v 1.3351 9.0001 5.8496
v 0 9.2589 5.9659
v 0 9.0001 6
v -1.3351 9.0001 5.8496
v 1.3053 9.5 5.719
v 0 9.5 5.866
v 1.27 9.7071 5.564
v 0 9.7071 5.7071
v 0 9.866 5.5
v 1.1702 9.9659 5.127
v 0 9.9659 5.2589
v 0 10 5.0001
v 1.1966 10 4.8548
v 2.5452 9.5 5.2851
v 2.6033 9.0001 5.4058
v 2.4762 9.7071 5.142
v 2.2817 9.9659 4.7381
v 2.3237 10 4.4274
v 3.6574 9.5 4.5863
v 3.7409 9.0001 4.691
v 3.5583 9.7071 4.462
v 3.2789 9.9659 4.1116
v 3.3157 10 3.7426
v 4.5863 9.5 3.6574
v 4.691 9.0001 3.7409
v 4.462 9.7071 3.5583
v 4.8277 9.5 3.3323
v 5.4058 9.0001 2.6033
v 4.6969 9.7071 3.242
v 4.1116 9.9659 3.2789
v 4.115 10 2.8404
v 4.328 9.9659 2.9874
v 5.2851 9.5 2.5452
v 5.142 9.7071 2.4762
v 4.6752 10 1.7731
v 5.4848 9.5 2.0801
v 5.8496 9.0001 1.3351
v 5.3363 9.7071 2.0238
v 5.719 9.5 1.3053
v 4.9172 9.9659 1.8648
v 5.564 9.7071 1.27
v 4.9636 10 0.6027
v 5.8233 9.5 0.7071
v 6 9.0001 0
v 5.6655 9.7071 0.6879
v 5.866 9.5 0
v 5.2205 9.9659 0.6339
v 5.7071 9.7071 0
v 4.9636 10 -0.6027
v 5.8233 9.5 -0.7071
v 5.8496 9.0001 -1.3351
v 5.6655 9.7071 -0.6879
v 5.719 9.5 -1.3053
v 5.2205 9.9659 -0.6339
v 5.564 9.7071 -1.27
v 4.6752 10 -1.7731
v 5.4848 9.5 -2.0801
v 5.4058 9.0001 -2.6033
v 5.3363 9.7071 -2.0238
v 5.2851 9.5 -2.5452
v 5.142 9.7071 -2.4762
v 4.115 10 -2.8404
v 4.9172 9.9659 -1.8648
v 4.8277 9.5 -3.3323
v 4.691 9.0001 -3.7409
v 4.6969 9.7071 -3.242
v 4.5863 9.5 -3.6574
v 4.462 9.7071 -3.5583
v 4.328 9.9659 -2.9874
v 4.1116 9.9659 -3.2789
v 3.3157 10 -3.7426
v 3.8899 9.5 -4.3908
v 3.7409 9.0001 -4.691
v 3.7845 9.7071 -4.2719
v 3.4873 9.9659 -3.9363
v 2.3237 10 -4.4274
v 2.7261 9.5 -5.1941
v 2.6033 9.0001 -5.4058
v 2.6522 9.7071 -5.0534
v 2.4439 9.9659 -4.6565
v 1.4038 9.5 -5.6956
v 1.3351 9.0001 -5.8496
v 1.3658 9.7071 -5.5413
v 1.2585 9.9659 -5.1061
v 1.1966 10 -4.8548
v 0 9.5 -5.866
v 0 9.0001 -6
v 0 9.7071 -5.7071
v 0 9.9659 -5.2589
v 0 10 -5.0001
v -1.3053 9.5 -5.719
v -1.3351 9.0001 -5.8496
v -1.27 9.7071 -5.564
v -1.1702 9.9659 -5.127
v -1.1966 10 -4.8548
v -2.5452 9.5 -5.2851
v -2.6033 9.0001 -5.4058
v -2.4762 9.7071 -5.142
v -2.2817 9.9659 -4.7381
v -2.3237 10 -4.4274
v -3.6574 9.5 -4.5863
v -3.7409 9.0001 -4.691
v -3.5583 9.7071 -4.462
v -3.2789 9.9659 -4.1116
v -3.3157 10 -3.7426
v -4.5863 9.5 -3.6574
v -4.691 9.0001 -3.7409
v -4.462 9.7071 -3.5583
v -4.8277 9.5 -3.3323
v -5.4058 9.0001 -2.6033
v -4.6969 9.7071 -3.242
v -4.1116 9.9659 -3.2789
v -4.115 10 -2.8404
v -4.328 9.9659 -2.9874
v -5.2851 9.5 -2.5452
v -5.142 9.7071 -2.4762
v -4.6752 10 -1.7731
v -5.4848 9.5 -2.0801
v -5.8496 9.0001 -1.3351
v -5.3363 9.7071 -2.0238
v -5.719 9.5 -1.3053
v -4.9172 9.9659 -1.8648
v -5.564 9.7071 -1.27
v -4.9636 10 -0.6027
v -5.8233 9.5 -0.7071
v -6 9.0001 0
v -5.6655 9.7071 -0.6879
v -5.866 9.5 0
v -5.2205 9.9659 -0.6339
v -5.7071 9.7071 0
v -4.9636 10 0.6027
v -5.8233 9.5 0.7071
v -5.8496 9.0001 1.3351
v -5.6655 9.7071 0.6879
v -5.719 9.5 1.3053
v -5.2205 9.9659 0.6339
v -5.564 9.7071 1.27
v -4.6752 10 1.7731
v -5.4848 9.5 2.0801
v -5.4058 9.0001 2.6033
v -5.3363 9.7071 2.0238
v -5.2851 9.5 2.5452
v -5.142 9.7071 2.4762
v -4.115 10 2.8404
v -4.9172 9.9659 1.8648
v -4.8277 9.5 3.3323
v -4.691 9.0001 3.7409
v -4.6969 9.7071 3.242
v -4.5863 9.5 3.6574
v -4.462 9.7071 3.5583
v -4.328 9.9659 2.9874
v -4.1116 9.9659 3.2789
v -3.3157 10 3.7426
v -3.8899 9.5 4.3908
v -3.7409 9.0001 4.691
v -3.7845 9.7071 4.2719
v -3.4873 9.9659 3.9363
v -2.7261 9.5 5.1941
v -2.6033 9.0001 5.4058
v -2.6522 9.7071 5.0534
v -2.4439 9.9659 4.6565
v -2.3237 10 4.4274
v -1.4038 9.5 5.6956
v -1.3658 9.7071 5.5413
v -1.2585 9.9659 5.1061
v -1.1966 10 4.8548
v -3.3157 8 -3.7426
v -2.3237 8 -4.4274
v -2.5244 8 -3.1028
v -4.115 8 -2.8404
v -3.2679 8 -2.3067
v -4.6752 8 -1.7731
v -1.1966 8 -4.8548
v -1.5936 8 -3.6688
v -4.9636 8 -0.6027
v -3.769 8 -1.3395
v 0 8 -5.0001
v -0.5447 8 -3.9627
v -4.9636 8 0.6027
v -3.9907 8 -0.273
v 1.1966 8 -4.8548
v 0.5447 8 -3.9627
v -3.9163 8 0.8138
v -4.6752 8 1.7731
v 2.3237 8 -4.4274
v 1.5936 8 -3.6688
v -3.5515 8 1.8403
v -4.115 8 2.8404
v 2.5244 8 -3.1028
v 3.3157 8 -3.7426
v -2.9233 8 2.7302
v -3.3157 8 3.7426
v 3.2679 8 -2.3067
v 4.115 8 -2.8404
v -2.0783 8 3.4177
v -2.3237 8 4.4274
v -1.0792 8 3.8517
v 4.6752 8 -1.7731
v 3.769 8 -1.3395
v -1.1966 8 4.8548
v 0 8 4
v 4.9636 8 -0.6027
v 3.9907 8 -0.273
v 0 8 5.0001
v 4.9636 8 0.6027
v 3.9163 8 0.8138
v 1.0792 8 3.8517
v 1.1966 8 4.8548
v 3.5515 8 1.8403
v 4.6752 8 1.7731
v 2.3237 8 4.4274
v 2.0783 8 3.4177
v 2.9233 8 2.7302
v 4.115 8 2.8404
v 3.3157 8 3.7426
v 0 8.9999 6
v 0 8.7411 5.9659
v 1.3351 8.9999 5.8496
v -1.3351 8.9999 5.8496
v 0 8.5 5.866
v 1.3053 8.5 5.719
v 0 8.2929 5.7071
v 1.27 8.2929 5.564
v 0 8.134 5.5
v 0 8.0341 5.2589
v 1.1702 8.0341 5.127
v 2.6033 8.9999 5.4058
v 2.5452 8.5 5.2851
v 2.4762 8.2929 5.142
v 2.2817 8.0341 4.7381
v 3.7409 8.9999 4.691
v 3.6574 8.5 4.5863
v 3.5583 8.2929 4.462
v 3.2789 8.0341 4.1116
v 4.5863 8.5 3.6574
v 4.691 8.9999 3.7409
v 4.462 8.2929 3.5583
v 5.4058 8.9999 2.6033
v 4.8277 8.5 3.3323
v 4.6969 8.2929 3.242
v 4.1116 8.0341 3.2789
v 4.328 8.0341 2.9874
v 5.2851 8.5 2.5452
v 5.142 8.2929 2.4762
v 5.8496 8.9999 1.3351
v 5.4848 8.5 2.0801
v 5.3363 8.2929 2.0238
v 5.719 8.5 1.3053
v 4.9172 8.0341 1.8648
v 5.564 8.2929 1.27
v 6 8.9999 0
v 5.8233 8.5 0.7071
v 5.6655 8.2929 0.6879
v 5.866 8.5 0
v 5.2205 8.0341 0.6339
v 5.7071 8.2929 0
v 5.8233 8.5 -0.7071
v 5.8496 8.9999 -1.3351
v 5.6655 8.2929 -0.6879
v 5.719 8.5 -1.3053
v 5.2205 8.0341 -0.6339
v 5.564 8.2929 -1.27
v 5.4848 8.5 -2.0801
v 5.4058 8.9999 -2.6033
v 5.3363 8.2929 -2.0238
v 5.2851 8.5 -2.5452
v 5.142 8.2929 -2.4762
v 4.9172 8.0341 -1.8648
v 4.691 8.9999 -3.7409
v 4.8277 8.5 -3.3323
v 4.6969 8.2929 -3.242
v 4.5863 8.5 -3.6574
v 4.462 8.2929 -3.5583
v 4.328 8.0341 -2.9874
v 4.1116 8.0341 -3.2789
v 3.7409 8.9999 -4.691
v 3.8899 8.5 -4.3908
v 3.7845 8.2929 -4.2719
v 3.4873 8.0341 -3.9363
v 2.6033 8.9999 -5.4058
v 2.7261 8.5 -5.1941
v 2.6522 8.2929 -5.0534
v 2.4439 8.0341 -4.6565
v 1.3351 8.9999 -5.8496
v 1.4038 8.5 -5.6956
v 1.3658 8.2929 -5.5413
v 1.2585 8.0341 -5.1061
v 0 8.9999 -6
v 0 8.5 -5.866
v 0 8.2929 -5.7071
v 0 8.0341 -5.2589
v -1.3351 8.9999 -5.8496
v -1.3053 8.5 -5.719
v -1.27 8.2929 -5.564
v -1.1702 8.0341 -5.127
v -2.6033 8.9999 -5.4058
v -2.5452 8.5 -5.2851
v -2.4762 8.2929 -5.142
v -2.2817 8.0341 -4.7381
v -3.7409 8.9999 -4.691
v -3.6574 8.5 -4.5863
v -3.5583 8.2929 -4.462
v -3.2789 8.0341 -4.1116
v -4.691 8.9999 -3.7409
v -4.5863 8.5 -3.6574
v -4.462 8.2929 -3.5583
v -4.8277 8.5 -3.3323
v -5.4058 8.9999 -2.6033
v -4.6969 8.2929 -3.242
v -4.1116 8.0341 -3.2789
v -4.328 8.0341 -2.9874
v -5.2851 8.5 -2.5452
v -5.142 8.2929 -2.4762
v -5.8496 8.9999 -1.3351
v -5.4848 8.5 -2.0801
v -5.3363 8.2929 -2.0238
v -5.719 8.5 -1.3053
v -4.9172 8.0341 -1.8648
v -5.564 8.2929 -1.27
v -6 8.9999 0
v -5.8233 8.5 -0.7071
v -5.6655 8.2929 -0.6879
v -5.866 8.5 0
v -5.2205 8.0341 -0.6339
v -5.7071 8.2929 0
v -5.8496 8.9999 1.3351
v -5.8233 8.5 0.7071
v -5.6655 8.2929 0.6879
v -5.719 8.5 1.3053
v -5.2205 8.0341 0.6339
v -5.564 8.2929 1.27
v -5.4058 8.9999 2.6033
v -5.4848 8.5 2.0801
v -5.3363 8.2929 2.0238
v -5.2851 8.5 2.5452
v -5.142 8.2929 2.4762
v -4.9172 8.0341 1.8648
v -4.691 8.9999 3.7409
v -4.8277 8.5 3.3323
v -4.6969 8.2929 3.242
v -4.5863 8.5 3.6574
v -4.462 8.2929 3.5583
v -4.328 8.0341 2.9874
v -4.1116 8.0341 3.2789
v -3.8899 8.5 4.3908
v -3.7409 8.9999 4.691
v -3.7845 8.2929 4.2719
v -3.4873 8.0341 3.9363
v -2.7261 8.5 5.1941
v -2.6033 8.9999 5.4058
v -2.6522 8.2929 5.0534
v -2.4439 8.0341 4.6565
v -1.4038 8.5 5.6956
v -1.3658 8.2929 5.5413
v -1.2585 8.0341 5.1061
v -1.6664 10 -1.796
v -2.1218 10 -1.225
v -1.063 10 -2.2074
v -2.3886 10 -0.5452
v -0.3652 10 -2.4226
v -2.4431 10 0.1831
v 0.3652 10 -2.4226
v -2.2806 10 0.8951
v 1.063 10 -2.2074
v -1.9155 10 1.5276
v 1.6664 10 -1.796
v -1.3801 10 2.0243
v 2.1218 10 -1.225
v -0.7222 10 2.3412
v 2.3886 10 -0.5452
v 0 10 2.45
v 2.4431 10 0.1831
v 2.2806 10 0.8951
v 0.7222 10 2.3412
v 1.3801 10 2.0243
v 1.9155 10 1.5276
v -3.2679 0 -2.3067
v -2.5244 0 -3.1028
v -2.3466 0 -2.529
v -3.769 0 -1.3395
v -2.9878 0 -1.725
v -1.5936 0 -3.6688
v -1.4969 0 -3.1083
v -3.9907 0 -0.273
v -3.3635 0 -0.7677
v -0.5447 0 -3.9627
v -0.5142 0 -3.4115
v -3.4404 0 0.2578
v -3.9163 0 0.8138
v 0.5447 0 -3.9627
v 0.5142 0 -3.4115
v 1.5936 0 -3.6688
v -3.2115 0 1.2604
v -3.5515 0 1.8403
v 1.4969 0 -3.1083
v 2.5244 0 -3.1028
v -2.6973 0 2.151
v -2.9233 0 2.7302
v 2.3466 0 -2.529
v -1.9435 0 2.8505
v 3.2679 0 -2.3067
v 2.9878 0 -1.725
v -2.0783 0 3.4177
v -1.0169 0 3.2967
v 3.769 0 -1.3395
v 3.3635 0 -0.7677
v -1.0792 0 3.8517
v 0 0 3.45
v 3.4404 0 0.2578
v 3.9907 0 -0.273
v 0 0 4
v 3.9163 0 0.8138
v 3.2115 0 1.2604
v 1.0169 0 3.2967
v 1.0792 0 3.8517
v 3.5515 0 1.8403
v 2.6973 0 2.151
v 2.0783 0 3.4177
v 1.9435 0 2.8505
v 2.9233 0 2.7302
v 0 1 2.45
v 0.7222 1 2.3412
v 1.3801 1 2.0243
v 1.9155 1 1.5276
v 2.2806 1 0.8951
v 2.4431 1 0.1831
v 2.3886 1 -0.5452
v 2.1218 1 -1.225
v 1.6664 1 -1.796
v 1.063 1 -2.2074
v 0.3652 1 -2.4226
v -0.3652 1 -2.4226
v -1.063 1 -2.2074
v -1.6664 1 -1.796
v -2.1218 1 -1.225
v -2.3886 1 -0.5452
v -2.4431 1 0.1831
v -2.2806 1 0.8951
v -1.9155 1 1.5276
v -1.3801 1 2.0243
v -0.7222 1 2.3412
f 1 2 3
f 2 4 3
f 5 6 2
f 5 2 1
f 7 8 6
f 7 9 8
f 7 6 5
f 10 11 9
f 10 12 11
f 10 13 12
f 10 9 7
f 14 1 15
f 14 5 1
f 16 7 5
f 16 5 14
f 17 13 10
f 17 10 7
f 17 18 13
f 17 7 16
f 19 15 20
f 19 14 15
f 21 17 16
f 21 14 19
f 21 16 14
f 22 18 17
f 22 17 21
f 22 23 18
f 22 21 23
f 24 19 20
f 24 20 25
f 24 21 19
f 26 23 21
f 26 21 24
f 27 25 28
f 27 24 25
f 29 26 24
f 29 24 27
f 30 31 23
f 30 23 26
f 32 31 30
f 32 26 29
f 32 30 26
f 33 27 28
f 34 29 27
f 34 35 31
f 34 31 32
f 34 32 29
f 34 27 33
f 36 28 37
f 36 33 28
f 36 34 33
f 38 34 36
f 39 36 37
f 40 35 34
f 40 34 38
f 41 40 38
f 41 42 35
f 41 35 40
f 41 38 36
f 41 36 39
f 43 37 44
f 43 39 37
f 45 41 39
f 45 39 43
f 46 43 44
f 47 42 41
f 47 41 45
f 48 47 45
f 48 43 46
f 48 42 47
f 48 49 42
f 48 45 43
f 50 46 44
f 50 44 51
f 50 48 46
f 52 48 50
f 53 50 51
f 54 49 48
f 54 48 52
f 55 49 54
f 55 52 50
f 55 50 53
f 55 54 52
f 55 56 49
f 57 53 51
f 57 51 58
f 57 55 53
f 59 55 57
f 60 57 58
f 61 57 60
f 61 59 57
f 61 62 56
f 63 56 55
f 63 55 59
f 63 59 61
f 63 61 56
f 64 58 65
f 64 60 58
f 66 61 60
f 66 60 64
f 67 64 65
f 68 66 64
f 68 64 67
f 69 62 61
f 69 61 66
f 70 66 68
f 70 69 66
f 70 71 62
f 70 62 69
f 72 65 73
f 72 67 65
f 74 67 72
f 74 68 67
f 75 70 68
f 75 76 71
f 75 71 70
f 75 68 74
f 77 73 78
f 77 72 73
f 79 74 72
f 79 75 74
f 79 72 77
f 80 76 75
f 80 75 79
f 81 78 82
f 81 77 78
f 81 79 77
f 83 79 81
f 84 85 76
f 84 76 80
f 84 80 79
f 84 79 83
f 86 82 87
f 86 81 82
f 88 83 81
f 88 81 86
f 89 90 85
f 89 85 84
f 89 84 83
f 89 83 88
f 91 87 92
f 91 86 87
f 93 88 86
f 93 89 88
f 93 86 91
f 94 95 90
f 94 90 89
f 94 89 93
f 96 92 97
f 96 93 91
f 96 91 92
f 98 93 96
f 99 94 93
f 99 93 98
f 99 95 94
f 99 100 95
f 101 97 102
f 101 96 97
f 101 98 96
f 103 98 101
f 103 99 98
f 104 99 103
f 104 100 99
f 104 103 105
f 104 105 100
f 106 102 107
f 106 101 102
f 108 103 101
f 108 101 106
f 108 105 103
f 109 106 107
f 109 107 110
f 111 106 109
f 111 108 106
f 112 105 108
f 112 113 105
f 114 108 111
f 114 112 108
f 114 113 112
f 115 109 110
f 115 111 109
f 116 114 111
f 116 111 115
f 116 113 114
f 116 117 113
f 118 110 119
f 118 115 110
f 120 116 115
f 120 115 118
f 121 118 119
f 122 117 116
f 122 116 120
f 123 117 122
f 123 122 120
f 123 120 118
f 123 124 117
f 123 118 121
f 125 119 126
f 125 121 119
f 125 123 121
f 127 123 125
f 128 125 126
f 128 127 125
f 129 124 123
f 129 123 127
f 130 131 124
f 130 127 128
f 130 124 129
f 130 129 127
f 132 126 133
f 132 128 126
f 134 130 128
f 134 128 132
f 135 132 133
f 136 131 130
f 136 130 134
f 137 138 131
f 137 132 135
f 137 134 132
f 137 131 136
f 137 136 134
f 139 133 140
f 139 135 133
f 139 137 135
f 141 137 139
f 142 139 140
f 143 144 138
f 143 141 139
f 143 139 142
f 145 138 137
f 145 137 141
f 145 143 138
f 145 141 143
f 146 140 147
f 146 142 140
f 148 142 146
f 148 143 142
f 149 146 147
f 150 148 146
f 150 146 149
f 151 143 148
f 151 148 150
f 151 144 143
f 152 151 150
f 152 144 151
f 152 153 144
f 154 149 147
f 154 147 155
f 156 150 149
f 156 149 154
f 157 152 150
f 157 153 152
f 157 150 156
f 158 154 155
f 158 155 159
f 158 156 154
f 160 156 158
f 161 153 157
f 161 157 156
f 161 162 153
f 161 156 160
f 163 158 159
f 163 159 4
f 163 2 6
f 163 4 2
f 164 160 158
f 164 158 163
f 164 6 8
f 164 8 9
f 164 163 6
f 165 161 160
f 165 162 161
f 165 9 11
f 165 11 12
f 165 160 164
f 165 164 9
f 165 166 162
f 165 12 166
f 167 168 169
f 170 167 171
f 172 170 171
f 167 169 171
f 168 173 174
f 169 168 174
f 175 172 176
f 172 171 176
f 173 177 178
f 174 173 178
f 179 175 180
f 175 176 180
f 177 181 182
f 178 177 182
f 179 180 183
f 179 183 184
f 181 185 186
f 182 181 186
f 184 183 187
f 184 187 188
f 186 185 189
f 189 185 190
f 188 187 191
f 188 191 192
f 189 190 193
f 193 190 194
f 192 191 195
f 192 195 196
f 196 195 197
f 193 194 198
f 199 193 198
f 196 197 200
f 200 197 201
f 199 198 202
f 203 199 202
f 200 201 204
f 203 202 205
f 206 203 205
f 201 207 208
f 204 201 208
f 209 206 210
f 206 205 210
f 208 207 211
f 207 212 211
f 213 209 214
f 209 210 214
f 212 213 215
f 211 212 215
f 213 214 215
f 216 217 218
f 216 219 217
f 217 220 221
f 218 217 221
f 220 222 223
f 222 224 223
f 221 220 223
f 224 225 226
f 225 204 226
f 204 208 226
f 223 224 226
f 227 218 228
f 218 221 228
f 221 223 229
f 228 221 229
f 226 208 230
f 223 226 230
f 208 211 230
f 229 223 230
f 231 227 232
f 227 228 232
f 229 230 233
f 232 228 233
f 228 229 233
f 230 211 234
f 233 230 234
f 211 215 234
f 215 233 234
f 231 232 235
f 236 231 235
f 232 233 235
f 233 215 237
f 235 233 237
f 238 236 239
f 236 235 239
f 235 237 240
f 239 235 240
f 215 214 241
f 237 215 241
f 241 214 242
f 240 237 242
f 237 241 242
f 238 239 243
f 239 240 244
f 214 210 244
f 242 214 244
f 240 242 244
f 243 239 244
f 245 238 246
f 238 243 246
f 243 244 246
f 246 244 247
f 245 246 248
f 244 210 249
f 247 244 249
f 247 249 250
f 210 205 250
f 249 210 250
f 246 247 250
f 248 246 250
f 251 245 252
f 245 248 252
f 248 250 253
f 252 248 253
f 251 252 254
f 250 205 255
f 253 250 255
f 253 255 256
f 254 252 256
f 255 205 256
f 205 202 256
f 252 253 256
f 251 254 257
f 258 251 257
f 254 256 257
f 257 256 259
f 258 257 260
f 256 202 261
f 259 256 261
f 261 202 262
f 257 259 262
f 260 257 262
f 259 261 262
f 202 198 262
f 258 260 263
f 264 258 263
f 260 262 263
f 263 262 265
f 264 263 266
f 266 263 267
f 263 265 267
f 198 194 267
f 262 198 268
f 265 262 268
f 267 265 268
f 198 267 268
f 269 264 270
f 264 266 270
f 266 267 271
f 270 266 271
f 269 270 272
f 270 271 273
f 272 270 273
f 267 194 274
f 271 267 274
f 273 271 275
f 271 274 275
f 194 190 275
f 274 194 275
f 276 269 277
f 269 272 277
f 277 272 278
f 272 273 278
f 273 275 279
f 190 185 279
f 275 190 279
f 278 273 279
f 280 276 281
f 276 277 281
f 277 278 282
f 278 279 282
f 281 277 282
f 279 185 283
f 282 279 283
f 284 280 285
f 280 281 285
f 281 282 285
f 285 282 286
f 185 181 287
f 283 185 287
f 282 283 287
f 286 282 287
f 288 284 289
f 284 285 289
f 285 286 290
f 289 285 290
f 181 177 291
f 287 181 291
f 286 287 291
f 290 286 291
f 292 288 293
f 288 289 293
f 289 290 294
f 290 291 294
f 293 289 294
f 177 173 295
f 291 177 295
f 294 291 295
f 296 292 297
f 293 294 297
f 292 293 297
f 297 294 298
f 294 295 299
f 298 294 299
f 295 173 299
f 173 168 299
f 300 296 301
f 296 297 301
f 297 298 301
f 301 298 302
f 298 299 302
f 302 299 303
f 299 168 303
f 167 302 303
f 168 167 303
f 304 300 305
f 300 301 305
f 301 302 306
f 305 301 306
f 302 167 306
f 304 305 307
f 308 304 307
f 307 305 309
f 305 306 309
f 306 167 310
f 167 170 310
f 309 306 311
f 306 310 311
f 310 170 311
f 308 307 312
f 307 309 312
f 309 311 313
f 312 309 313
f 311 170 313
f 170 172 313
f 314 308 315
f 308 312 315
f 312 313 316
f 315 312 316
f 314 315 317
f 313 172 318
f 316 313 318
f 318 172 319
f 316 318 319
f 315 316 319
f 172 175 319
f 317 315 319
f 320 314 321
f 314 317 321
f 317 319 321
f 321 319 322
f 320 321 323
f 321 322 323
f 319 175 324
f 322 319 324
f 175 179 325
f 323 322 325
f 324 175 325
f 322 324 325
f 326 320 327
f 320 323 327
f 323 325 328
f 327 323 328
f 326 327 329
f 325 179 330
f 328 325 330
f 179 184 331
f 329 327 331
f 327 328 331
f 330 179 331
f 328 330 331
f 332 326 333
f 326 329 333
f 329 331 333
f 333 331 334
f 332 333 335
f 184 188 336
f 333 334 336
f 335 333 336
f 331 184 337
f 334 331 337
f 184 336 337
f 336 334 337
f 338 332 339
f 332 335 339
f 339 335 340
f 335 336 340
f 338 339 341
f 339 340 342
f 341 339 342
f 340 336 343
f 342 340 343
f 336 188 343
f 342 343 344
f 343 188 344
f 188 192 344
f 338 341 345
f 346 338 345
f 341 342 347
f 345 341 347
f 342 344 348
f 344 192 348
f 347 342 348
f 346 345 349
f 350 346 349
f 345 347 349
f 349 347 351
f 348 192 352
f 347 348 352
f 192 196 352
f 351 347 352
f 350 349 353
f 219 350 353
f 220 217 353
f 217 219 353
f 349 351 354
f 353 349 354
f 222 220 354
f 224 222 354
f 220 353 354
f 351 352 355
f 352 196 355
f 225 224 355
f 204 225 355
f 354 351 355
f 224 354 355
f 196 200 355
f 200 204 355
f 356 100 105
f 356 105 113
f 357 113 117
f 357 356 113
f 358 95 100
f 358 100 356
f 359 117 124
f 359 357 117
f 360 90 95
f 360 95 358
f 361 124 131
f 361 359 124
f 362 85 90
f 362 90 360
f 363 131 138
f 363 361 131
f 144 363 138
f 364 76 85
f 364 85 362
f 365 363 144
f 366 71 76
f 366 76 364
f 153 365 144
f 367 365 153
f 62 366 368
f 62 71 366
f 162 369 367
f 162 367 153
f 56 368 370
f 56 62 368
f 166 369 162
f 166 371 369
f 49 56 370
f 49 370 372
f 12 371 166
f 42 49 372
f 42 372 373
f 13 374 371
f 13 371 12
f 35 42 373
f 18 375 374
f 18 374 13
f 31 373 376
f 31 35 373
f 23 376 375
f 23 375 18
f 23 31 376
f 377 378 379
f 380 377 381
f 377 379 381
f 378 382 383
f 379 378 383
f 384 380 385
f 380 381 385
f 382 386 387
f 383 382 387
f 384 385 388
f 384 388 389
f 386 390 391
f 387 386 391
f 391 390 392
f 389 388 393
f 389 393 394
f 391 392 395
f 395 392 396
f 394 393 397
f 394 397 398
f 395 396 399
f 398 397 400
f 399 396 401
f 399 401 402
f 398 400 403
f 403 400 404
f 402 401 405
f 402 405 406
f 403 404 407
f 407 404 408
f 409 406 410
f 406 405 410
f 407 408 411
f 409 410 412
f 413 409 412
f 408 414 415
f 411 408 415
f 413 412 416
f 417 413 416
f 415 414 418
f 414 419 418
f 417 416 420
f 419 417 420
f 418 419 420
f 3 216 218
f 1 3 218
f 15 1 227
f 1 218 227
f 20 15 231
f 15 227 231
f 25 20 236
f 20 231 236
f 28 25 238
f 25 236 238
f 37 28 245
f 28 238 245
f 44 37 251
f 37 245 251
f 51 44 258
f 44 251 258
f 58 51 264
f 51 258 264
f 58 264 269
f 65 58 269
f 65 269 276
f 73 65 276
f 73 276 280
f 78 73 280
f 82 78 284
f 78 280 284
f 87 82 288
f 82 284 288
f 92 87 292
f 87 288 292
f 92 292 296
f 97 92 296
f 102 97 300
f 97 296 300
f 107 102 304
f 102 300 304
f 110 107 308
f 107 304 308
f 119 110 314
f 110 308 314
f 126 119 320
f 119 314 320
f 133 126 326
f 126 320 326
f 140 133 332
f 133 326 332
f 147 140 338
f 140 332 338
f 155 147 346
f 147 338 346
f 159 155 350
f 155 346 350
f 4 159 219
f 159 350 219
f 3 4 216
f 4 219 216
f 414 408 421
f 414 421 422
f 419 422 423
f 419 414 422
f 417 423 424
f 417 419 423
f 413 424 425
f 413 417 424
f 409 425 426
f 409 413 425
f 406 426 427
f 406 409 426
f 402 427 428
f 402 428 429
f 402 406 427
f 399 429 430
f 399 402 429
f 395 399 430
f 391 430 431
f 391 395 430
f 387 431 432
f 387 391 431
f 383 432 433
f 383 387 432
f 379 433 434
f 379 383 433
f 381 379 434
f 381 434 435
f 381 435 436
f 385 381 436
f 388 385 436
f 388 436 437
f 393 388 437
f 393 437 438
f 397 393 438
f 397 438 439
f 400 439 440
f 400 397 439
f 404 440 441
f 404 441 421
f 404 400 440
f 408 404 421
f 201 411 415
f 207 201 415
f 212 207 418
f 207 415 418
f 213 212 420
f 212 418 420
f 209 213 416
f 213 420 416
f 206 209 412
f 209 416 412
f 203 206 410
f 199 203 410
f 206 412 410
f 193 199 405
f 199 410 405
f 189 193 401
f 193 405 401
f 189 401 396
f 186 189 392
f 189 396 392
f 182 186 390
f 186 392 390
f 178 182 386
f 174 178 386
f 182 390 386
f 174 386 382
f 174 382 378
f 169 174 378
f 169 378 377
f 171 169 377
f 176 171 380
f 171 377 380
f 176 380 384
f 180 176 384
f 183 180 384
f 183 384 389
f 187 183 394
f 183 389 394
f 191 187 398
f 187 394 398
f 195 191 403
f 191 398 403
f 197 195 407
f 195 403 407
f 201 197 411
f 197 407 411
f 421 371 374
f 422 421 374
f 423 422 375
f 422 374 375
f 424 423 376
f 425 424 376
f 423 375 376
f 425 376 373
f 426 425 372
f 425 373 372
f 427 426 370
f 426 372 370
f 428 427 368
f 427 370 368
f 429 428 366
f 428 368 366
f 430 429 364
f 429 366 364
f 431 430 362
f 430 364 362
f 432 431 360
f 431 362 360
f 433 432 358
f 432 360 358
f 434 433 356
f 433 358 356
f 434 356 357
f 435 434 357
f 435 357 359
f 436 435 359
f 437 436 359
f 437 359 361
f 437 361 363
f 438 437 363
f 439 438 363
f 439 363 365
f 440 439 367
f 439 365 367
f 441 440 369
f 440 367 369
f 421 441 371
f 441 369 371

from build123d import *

# Parameters (mm, degrees)
SKETCH1_R           = 4
SKETCH1_R_2         = 2.45
BOSS_EXTRUDE1_DEPTH = 8
SKETCH2_R           = 6
BOSS_EXTRUDE2_DEPTH = 2
FILLET1_R           = 1
CUT_EXTRUDE1_REACH  = 15.115
SKETCH3_R           = 2.45
CHAMFER1_SIZE       = 1


with BuildPart() as part:
    # Sketch1 → Boss-Extrude1 (new body)
    with BuildSketch(Plane(origin=(0, 0, 0), x_dir=(1, 0, 0), z_dir=(0, 1, 0))):
        with Locations(Location((0, 0, 0), (0, 0, 270))):
            Circle(SKETCH1_R)
        with Locations(Location((0, 0, 0), (0, 0, 270))):
            Circle(SKETCH1_R_2, mode=Mode.SUBTRACT)
    extrude(amount=BOSS_EXTRUDE1_DEPTH)

    # Sketch2 → Boss-Extrude2 (add)
    with BuildSketch(Plane(origin=(0, 8, 0), x_dir=(1, 0, 0), z_dir=(0, 1, 0))):
        with Locations(Location((0, 0, 0), (0, 0, 270))):
            Circle(SKETCH2_R)
    extrude(amount=BOSS_EXTRUDE2_DEPTH)

    # Fillet1
    fillet1_edges = [part.edges().sort_by_distance(p)[0] for p in [
        (0, 8, -6),
        (0, 10, -6),
    ]]
    fillet(fillet1_edges, radius=FILLET1_R - 0.0001)  # a hair under: the kernel refuses the full size

    # Sketch3 → Cut-Extrude1 (cut, up to next)
    with BuildSketch(Plane(origin=(0, 10, 0), x_dir=(1, 0, 0), z_dir=(0, 1, 0)), mode=Mode.PRIVATE) as cut_extrude1_sk1:
        with Locations(Location((0, 0, 0), (0, 0, 270))):
            Circle(SKETCH3_R)
    cut_extrude1_tool1 = extrude(cut_extrude1_sk1.sketch, amount=-CUT_EXTRUDE1_REACH, mode=Mode.PRIVATE) & part.part
    add(cut_extrude1_tool1.solids().sort_by_distance((0, 10, 0))[0], mode=Mode.SUBTRACT)

    # Chamfer1
    chamfer1_edges = [part.edges().sort_by_distance(p)[0] for p in [
        (0, 0, -2.45),
    ]]
    chamfer(chamfer1_edges, length=CHAMFER1_SIZE)


solid = part.part
